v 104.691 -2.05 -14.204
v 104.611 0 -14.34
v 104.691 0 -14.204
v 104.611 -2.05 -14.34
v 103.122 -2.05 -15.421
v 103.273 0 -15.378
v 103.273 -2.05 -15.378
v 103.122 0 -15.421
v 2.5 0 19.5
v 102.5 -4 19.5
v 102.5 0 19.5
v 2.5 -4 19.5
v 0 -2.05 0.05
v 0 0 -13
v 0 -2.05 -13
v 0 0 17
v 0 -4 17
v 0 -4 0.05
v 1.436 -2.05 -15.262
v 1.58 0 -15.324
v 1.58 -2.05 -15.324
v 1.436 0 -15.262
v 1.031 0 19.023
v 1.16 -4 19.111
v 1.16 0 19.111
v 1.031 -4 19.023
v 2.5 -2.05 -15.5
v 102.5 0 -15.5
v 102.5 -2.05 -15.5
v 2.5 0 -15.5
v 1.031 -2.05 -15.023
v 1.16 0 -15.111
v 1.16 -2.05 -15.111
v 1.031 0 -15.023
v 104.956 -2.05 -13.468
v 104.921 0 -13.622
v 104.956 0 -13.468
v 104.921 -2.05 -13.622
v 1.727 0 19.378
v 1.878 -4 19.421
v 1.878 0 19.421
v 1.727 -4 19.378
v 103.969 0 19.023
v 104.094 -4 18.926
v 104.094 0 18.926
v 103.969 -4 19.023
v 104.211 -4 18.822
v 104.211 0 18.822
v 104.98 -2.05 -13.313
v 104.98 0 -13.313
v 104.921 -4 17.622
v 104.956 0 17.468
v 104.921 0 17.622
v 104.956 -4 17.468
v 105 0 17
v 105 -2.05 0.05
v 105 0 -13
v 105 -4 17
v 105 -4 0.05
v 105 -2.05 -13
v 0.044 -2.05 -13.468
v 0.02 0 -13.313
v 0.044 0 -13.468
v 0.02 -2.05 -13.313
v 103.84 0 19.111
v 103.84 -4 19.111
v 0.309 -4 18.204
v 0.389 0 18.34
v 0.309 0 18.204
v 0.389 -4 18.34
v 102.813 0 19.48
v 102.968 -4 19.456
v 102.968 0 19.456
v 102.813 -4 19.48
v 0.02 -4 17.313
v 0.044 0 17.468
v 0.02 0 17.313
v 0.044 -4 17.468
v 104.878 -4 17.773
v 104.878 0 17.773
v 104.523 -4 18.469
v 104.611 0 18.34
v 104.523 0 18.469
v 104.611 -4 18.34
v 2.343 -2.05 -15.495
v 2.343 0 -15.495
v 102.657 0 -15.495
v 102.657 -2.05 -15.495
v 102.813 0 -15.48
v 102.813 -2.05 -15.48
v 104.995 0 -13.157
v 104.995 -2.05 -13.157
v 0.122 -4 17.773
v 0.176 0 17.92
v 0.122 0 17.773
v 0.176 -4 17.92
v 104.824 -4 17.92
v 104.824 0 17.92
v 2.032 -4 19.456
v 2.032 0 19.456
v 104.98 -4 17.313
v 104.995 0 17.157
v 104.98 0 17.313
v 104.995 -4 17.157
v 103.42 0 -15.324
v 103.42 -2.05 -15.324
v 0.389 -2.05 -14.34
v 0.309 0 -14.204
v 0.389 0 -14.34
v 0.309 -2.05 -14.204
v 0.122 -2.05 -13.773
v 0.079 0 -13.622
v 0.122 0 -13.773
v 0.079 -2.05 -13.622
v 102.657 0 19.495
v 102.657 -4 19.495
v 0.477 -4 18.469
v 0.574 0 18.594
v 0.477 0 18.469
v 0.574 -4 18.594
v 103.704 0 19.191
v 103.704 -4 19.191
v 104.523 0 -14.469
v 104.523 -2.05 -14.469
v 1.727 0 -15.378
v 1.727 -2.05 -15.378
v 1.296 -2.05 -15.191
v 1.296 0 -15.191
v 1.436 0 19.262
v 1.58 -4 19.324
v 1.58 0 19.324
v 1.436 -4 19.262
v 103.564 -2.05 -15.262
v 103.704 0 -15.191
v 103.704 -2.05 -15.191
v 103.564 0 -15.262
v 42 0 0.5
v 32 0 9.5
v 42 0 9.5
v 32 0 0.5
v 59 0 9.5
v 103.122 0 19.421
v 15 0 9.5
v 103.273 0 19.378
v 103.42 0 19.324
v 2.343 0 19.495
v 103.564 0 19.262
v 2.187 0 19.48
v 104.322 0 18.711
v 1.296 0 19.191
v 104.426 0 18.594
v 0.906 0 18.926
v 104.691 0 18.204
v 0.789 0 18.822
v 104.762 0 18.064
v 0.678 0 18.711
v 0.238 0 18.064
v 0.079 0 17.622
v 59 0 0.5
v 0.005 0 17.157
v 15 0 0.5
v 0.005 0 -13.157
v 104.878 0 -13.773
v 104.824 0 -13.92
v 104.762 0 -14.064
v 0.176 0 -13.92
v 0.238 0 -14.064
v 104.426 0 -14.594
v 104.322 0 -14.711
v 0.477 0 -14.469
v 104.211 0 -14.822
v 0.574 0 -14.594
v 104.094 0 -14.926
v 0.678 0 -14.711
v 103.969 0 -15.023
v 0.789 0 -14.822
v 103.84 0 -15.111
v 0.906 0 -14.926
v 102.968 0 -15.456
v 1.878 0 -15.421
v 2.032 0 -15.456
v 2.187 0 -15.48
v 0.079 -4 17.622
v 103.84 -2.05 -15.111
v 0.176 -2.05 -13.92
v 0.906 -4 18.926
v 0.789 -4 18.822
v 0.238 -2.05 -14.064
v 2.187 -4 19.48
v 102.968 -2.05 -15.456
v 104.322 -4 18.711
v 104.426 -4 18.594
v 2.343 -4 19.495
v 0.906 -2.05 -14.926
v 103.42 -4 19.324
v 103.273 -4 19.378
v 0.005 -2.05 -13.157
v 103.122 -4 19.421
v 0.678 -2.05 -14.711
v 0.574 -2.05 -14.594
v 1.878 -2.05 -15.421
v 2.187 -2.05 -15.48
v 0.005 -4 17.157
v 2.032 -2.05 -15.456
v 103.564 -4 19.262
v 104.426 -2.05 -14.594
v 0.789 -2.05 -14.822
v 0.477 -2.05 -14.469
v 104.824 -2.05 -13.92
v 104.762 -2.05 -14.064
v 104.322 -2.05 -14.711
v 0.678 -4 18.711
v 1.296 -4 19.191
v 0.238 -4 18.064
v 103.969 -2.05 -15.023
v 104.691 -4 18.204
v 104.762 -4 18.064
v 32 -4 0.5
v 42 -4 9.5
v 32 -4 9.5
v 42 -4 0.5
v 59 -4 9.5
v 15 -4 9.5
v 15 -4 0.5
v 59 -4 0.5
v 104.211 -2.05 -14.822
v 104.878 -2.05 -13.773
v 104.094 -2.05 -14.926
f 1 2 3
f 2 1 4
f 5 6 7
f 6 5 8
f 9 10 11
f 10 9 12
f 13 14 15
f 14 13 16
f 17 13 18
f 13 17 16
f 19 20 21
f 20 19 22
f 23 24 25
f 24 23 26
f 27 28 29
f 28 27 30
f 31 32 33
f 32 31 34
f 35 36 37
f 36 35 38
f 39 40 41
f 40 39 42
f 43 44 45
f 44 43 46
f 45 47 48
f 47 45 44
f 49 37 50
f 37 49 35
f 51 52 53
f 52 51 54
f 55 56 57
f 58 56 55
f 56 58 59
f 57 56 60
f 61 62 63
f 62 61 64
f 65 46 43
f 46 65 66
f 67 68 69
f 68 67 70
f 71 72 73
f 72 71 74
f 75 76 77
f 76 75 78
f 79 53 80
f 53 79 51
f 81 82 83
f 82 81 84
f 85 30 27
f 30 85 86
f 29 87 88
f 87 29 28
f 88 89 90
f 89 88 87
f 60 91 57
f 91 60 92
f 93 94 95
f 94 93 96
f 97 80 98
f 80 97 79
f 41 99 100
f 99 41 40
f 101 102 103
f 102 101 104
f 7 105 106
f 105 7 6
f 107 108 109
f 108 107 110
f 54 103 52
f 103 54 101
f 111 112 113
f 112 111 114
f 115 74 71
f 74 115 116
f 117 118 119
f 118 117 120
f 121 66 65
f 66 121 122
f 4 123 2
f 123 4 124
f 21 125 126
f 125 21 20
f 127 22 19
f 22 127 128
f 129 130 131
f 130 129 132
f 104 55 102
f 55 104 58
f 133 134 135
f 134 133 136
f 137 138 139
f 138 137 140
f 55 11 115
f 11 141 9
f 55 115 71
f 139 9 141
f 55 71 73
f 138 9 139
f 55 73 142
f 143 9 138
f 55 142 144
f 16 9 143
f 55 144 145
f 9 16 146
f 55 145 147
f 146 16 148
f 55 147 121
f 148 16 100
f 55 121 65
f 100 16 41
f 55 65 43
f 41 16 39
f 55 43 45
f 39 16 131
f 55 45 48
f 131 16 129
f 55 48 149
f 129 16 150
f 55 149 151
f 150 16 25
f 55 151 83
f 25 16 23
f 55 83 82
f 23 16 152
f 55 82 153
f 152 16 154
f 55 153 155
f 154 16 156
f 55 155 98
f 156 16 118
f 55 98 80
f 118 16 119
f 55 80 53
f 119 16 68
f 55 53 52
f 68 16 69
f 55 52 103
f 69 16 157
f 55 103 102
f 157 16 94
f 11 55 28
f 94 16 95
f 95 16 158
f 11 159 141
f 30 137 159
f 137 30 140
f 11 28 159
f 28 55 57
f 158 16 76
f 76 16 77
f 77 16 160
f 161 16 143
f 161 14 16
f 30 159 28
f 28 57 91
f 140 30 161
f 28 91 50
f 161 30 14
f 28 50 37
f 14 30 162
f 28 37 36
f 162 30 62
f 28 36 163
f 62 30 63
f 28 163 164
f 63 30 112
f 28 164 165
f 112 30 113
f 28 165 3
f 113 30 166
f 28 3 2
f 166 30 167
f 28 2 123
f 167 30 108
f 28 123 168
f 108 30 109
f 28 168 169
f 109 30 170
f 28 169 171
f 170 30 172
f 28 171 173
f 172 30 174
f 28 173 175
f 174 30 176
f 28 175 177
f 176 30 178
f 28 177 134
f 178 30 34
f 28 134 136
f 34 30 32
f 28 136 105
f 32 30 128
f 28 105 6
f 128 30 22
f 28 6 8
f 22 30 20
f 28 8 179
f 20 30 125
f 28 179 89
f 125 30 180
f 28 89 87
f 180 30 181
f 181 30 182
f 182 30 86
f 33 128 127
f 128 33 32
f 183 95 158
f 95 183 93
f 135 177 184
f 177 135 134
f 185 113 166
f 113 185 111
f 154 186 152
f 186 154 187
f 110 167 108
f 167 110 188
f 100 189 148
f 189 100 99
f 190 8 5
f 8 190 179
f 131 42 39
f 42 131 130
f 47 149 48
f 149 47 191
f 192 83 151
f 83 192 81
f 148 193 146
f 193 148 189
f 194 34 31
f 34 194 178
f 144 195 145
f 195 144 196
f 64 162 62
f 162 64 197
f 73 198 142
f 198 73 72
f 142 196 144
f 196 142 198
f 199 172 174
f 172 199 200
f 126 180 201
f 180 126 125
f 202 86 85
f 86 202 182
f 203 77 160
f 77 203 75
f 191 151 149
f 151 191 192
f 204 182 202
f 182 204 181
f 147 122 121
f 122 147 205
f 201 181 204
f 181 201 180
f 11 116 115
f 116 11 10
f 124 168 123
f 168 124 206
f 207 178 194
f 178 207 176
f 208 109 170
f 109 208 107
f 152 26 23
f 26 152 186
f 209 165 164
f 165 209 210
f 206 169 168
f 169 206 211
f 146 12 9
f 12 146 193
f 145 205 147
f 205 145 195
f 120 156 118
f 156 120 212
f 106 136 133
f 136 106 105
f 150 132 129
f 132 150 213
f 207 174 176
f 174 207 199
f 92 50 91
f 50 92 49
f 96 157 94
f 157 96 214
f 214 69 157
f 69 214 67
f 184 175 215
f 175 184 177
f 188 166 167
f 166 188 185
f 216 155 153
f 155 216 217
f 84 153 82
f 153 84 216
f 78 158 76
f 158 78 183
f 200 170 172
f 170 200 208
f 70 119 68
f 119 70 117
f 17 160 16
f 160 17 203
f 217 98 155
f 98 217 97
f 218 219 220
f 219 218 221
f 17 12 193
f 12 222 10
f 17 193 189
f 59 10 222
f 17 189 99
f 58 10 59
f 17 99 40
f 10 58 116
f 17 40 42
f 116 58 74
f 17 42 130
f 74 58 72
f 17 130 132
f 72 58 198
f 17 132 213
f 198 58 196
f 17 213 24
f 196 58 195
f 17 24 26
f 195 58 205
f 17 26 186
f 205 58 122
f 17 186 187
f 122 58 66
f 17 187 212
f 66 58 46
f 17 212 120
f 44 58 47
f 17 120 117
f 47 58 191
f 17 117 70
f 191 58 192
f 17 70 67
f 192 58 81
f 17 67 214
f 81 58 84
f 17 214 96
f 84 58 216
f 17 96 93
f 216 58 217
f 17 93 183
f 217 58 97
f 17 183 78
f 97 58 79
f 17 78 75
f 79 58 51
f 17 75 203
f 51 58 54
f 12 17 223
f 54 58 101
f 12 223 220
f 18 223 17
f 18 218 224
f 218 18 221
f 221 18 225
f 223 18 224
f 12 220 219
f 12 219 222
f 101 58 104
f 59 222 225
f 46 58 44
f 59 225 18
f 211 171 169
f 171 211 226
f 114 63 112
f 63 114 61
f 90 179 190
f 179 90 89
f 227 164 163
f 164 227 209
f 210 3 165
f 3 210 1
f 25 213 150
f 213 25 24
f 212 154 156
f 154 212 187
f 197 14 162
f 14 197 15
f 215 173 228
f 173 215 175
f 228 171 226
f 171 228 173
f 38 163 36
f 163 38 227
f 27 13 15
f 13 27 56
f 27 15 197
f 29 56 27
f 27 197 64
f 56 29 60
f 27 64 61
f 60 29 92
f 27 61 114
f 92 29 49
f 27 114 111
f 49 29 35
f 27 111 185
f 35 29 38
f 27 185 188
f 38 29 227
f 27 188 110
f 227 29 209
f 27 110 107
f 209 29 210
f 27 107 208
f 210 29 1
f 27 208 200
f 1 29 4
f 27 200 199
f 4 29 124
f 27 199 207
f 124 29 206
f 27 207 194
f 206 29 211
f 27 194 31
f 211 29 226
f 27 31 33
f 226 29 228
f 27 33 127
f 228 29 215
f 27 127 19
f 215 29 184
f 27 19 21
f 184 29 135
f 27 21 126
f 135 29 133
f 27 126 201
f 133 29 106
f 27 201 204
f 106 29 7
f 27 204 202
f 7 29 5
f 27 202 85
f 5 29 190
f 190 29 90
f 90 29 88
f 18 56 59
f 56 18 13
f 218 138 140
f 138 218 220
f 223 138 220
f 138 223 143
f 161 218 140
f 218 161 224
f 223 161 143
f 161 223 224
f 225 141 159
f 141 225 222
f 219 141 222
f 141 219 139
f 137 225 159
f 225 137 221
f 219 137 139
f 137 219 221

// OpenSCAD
$fn=100;
eps = 0.01;

d = 5;
base_h = 4;
cut_h = 2;
l = 100;
cut_a = 18;
base_a = 30;

module
    barrier(d=d,base_h=base_h,cut_h=cut_h,l=l,cut_a=cut_a,base_a=base_a)
{
    difference()
    {
        hull()
        {
            cylinder(d=d,h=base_h);
            translate([l,0,0]) cylinder(d=d,h=base_h);
            translate([l,base_a,0]) cylinder(d=d,h=base_h);
            translate([0,base_a,0]) cylinder(d=d,h=base_h);           
        }
        translate([-d-0.05,-d-0.05,base_h-cut_h+0.05])
            cube([2*d+l+0.1,cut_a+0.1,cut_h]);
    }
}

//barrier();

module USB_barrier()
{
    usb_xo = 15;
    usb_yo = base_h + eps;
    usb_zo = 0.5;
    
    usb_x = 17;
    usb_y = base_h+2*eps;
    usb_z = 9;
    
    usb_off= 10;
    
    x_leveling = d/2;
    z_leveling = cut_a-d;
    difference()
    {
        translate([d/2,0,-z_leveling]) rotate([90,0,0])
            barrier();
        translate([usb_xo,-usb_yo,usb_zo])
            cube([usb_x,usb_y, usb_z]);
        translate([usb_xo+usb_off+usb_x,-usb_yo,usb_zo])
            cube([usb_x,usb_y, usb_z]);
        
    }
}

USB_barrier();
